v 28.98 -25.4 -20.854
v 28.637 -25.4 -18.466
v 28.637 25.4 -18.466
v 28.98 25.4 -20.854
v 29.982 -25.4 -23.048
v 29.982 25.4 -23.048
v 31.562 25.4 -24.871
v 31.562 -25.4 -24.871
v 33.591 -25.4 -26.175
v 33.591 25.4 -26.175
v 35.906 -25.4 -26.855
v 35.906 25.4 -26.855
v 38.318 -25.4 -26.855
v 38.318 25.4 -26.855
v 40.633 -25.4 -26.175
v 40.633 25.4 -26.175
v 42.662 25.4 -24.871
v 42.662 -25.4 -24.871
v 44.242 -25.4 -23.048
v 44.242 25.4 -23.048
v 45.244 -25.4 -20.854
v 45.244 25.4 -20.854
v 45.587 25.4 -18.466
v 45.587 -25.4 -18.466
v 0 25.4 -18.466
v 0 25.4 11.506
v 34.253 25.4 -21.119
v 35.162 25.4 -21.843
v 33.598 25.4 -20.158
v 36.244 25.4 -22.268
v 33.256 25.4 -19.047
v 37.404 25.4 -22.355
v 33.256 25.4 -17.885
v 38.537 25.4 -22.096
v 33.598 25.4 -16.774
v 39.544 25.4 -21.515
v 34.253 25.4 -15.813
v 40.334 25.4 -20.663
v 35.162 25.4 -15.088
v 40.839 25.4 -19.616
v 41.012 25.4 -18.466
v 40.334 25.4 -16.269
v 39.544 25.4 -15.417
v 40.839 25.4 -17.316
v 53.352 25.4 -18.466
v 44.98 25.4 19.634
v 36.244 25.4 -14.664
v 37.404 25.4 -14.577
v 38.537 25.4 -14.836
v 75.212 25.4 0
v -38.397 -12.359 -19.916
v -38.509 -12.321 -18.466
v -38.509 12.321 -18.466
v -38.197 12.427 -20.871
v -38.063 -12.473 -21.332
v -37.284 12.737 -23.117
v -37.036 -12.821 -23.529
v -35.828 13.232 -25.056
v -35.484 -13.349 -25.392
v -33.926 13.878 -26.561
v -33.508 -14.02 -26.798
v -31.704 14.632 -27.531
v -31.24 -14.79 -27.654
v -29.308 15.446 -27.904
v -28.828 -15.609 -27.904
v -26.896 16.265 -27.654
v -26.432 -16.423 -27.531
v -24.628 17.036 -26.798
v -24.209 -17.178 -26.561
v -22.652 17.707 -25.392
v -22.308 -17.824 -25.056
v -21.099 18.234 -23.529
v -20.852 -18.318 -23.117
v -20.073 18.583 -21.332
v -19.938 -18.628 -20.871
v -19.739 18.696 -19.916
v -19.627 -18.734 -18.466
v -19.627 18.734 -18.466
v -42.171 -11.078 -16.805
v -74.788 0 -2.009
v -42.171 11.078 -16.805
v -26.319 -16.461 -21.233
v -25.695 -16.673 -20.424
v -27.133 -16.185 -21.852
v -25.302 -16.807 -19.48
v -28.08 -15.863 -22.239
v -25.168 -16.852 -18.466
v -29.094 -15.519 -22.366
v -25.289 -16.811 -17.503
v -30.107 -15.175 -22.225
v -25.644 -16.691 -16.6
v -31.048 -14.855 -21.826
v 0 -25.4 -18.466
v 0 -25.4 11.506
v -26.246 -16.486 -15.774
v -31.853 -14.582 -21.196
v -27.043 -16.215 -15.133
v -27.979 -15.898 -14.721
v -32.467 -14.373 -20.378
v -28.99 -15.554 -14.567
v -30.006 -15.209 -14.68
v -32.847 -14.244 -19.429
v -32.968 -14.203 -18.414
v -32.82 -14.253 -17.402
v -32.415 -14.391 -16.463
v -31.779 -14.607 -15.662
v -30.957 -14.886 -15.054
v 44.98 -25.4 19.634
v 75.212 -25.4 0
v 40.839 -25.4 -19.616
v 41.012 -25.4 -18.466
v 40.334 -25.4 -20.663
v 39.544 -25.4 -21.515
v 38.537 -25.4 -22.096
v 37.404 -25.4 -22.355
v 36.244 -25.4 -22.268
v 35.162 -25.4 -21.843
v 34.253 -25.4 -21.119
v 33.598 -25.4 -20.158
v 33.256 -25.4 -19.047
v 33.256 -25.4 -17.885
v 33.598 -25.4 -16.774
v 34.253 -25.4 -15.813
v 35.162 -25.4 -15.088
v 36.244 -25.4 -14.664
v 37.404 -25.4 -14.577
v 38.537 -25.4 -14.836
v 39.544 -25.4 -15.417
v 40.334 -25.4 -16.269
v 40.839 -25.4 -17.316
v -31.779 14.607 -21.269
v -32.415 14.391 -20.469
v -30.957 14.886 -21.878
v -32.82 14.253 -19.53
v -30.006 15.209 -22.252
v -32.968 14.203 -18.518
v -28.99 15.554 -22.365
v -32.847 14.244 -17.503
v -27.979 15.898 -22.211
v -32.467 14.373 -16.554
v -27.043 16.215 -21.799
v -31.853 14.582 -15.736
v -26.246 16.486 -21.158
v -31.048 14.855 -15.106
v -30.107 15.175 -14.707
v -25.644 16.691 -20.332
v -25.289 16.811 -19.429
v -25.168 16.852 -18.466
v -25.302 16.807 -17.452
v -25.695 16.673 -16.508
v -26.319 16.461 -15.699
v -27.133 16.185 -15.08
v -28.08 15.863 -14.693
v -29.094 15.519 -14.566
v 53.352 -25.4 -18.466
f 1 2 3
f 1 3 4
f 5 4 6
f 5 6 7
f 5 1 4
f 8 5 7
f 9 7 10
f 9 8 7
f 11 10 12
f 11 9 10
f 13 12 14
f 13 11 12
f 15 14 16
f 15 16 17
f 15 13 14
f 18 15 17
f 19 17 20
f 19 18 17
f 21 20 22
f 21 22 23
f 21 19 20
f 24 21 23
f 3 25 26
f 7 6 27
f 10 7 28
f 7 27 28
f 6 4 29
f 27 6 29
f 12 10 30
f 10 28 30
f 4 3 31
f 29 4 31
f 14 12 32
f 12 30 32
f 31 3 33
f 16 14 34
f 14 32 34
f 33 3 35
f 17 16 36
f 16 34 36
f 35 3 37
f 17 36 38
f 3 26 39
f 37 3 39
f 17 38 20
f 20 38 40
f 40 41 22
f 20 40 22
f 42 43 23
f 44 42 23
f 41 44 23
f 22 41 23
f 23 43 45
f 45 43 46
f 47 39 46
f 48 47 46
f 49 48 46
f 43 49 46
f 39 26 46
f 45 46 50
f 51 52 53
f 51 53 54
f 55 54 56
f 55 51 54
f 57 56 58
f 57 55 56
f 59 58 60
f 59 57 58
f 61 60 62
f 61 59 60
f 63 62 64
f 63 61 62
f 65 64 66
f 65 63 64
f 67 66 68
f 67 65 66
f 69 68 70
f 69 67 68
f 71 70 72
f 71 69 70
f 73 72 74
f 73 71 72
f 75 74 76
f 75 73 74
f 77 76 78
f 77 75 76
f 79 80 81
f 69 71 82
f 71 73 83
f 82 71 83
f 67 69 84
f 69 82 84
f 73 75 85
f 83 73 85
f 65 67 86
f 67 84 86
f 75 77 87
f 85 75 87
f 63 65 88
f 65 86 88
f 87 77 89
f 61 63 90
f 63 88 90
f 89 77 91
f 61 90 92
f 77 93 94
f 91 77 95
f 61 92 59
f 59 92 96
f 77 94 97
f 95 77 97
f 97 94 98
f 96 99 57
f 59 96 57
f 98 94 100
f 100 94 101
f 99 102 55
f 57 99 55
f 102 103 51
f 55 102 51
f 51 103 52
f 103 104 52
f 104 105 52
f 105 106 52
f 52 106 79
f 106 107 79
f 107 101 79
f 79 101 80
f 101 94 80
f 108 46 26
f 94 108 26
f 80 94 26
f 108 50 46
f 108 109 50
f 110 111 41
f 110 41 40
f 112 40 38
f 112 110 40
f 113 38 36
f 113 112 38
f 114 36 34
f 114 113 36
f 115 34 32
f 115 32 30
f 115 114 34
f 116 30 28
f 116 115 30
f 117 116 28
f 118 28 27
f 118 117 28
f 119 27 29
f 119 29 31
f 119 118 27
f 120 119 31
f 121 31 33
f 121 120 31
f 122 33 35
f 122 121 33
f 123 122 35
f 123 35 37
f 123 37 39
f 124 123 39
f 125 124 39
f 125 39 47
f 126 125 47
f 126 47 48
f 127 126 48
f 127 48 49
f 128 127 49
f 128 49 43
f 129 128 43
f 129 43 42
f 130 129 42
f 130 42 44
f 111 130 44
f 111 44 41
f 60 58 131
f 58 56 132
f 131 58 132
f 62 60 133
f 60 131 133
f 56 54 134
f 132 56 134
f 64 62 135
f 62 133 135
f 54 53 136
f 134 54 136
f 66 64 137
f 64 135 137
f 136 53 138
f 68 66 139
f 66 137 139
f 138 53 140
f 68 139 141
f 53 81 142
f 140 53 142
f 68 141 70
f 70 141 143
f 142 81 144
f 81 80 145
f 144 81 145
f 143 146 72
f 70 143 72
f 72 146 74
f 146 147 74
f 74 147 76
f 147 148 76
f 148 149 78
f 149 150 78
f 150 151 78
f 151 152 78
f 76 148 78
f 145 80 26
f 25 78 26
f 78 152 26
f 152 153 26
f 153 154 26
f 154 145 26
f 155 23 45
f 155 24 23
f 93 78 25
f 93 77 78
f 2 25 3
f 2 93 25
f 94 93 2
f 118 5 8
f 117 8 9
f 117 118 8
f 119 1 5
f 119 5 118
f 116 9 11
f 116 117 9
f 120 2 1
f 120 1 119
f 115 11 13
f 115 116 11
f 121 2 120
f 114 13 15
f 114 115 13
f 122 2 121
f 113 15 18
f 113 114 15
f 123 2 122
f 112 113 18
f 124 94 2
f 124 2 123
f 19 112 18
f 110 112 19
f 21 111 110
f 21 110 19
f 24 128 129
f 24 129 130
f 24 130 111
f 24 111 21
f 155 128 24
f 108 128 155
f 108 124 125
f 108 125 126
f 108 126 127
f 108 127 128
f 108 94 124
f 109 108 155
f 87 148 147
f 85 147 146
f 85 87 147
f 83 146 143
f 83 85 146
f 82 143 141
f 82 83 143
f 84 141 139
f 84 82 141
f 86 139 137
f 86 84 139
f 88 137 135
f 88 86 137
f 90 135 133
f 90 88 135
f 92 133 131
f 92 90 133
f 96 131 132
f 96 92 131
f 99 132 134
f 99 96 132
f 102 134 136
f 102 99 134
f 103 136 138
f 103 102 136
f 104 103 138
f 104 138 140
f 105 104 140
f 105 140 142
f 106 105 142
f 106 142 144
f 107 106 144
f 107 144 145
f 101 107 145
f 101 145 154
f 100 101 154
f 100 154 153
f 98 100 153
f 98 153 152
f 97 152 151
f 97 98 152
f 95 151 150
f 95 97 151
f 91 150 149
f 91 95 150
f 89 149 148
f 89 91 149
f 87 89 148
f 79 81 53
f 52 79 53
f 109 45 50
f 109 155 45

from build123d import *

# Parameters (mm, degrees)
F1_DEPTH = 25.4
F2_DEPTH = 12.7
F4_DEPTH = 101.6


with BuildPart() as f1:
    # F0 (on Front) → F1 (new body, symmetric)
    with BuildSketch(Plane.XZ):
        with BuildLine():
            Line((44.9795118183, 19.6340414269), (-74.7879317753, -2.009495511))
            Line((-74.7879317753, -2.009495511), (-42.1710492869, -16.8047615714))
            ThreePointArc((-42.1710492869, -16.8047615714), (-28.2356794376, -5.2842052737), (-15.8599317753, -18.4659585731))
            Line((-15.8599317753, -18.4659585731), (23.9040682247, -18.4659585731))
            ThreePointArc((23.9040682247, -18.4659585731), (37.1120682247, -5.2579585731), (50.3200682247, -18.4659585731))
            Line((50.3200682247, -18.4659585731), (53.351612715, -18.4659585731))
            Line((53.351612715, -18.4659585731), (75.2120682247, 0))
            Line((75.2120682247, 0), (44.9795118183, 19.6340414269))
        make_face()
        with BuildLine():
            ThreePointArc((50.3200682247, -18.4659585731), (37.1120682247, -5.2579585731), (23.9040682247, -18.4659585731))
            Line((23.9040682247, -18.4659585731), (28.6366716027, -18.4659585731))
            Line((28.6366716027, -18.4659585731), (33.2120682247, -18.4659585731))
            ThreePointArc((33.2120682247, -18.4659585731), (37.1120682247, -14.5659585731), (41.0120682247, -18.4659585731))
            Line((41.0120682247, -18.4659585731), (45.5874648466, -18.4659585731))
            Line((45.5874648466, -18.4659585731), (50.3200682247, -18.4659585731))
        make_face()
        with BuildLine():
            ThreePointArc((-15.8599317753, -18.4659585731), (-28.2356794376, -5.2842052737), (-42.1710492869, -16.8047615714))
            Line((-42.1710492869, -16.8047615714), (-38.5088598291, -18.4659585731))
            Line((-38.5088598291, -18.4659585731), (-32.9679317753, -18.4659585731))
            ThreePointArc((-32.9679317753, -18.4659585731), (-29.0679317753, -14.5659585731), (-25.1679317753, -18.4659585731))
            Line((-25.1679317753, -18.4659585731), (-19.6270037216, -18.4659585731))
            Line((-19.6270037216, -18.4659585731), (-15.8599317753, -18.4659585731))
        make_face()
        with BuildLine():
            Line((-32.9679317753, -18.4659585731), (-38.5088598291, -18.4659585731))
            ThreePointArc((-38.5088598291, -18.4659585731), (-29.0679317753, -27.9068866268), (-19.6270037216, -18.4659585731))
            Line((-19.6270037216, -18.4659585731), (-25.1679317753, -18.4659585731))
            ThreePointArc((-25.1679317753, -18.4659585731), (-29.0679317753, -22.3659585731), (-32.9679317753, -18.4659585731))
        make_face()
        with BuildLine():
            Line((33.2120682247, -18.4659585731), (28.6366716027, -18.4659585731))
            ThreePointArc((28.6366716027, -18.4659585731), (37.1120682247, -26.941355195), (45.5874648466, -18.4659585731))
            Line((45.5874648466, -18.4659585731), (41.0120682247, -18.4659585731))
            ThreePointArc((41.0120682247, -18.4659585731), (37.1120682247, -22.3659585731), (33.2120682247, -18.4659585731))
        make_face()
    extrude(amount=F1_DEPTH, both=True)

    # F0 (on Front) → F2 (join, symmetric)
    with BuildSketch(Plane.XZ):
        with BuildLine():
            ThreePointArc((-15.8599317753, -18.4659585731), (-28.2356794376, -5.2842052737), (-42.1710492869, -16.8047615714))
            Line((-42.1710492869, -16.8047615714), (-38.5088598291, -18.4659585731))
            Line((-38.5088598291, -18.4659585731), (-32.9679317753, -18.4659585731))
            ThreePointArc((-32.9679317753, -18.4659585731), (-29.0679317753, -14.5659585731), (-25.1679317753, -18.4659585731))
            Line((-25.1679317753, -18.4659585731), (-19.6270037216, -18.4659585731))
            Line((-19.6270037216, -18.4659585731), (-15.8599317753, -18.4659585731))
        make_face()
        with BuildLine():
            ThreePointArc((50.3200682247, -18.4659585731), (37.1120682247, -5.2579585731), (23.9040682247, -18.4659585731))
            Line((23.9040682247, -18.4659585731), (28.6366716027, -18.4659585731))
            Line((28.6366716027, -18.4659585731), (33.2120682247, -18.4659585731))
            ThreePointArc((33.2120682247, -18.4659585731), (37.1120682247, -14.5659585731), (41.0120682247, -18.4659585731))
            Line((41.0120682247, -18.4659585731), (45.5874648466, -18.4659585731))
            Line((45.5874648466, -18.4659585731), (50.3200682247, -18.4659585731))
        make_face()
    extrude(amount=F2_DEPTH, both=True)

    # F3 (on Top) → F4 (cut, symmetric)
    with BuildSketch(Plane.XY):
        Polygon((0, -25.4), (-74.7879317753, 0), (0, 25.4), (0, 56.2246665359), (-99.1614311934, 56.2246665359), (-99.1614311934, -55.5053986609), (0, -55.5053986609), align=None)
    extrude(amount=F4_DEPTH, both=True, mode=Mode.SUBTRACT)


solid = f1.part
